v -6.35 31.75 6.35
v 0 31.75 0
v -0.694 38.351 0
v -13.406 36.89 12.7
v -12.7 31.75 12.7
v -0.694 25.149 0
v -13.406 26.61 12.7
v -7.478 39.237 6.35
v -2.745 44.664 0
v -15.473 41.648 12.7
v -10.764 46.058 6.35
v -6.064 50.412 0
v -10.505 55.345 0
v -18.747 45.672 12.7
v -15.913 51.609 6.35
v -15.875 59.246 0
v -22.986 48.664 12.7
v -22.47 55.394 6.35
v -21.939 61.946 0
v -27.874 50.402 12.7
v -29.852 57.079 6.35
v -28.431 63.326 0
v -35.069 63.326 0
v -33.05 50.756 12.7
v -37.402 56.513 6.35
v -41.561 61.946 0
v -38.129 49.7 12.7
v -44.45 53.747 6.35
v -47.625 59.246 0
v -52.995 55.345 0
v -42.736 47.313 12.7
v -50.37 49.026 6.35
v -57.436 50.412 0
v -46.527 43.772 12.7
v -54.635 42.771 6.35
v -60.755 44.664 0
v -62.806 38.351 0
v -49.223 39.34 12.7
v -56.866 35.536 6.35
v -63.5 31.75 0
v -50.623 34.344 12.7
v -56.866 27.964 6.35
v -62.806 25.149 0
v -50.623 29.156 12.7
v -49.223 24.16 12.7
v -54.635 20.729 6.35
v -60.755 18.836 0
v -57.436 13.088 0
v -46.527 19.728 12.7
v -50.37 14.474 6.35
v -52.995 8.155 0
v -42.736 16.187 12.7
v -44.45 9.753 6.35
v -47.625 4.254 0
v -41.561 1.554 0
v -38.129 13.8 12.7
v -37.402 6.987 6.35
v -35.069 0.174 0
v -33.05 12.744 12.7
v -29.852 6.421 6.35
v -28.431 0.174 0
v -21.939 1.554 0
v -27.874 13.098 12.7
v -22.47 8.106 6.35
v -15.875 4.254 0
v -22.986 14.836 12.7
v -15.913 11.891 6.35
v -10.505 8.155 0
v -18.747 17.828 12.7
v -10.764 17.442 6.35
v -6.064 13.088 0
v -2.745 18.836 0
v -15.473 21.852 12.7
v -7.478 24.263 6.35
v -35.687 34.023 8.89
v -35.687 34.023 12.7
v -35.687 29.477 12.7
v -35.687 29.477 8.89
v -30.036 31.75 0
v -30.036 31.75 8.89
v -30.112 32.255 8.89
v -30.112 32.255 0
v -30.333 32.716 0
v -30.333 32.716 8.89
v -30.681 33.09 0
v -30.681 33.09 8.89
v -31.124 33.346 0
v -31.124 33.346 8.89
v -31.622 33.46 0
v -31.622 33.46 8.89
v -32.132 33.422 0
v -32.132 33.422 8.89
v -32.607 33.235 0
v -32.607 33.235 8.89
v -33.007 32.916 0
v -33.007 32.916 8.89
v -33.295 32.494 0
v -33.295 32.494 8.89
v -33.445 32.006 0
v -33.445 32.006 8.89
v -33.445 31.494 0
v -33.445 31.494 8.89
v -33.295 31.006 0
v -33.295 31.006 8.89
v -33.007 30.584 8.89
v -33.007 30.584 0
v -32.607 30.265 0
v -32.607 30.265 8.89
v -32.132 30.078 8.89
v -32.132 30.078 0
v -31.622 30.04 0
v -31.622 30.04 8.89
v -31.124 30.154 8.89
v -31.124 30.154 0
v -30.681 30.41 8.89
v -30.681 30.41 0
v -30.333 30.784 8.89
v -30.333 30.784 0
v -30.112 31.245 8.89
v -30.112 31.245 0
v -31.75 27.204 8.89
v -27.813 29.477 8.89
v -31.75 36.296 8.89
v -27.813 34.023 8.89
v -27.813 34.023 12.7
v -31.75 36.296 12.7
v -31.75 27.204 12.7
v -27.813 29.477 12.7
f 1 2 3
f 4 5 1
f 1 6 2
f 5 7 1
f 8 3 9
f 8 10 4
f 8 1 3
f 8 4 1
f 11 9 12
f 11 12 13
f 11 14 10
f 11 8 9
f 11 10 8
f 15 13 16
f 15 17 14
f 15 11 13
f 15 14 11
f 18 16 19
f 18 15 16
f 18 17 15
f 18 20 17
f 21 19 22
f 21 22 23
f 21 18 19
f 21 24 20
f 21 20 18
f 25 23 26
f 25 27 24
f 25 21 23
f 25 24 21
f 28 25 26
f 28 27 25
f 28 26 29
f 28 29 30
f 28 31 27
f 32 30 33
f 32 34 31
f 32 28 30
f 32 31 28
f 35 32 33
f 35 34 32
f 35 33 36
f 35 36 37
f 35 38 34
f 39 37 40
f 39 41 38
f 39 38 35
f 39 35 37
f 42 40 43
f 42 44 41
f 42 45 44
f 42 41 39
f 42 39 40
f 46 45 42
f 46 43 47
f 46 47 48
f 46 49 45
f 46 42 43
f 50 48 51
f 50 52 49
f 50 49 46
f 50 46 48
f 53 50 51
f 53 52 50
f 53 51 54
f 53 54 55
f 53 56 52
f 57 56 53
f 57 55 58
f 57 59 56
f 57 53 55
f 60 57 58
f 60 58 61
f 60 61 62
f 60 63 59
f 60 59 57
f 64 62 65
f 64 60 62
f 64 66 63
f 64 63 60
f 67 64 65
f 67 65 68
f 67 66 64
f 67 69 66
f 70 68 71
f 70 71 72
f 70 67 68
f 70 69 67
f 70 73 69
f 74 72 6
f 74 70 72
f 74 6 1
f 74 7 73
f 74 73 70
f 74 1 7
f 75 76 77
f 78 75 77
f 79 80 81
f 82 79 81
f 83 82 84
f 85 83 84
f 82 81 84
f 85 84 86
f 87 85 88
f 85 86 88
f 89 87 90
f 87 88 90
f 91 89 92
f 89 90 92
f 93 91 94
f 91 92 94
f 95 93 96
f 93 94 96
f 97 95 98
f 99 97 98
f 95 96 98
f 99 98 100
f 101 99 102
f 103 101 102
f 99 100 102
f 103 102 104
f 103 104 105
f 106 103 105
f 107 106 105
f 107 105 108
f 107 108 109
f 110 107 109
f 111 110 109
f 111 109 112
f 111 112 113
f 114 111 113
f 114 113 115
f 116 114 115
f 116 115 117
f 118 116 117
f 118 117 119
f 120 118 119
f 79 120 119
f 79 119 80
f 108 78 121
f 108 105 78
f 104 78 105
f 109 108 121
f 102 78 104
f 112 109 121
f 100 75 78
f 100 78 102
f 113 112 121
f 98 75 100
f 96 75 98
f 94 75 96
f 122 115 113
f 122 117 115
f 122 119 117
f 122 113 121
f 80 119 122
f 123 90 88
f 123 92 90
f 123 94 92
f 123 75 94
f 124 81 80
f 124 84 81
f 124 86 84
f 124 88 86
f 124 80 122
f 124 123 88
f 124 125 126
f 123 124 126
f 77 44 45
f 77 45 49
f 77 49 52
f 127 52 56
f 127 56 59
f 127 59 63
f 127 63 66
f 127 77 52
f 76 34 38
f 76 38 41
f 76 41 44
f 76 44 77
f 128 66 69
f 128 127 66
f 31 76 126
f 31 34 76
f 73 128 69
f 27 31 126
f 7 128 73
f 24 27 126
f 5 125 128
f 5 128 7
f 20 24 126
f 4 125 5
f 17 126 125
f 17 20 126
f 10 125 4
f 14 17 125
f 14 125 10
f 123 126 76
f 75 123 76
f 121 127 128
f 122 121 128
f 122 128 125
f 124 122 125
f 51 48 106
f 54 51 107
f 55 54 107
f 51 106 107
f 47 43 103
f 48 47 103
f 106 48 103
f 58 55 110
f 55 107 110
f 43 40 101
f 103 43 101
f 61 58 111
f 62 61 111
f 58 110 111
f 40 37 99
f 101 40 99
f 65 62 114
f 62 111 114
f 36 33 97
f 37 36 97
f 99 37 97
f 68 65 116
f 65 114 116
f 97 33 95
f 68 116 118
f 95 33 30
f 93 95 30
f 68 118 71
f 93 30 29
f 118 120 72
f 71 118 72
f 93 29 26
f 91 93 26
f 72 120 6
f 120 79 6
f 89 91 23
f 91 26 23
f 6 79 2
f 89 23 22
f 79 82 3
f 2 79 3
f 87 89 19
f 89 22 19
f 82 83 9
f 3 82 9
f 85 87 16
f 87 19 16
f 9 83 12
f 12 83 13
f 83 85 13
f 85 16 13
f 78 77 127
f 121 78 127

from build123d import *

# Parameters (mm, degrees)
F2_R     = 25.4
F2_R_2   = 1.7145
F4_DEPTH = 12.7
F0_R     = 31.75
F0_R_2   = 1.7145
F5_DEPTH = 12.7
F6_R     = 1.7145
F7_DEPTH = 3.81
F8_SIZE2 = 12.69999
F8_SIZE  = 12.69999


# Not quite as in the source:
# - a fillet or chamfer is up to 0.001 mm smaller than in the source, because OpenCascade refuses the exact size


with BuildPart() as f4:
    # F2 (on offset) → F4 (new body)
    with BuildSketch(Plane.XY.offset(12.7)):
        with Locations((-31.75, 31.75)):
            Circle(F2_R)
        with Locations((-31.75, 31.75)):
            Circle(F2_R_2, mode=Mode.SUBTRACT)
    extrude(amount=-F4_DEPTH)

    # F0 (on Top) → F5 (join)
    with BuildSketch(Plane.XY):
        with Locations((-31.75, 31.75)):
            Circle(F0_R)
        with Locations((-31.75, 31.75)):
            Circle(F0_R_2, mode=Mode.SUBTRACT)
    extrude(amount=F5_DEPTH)

    # F6 (on face) → F7 (cut)
    with BuildSketch(Plane.XY.offset(12.7)):
        Polygon((-27.813, 29.4769719902), (-27.813, 34.0230280098), (-31.75, 36.2960560196), (-35.687, 34.0230280098), (-35.687, 29.4769719902), (-31.75, 27.2039439804), align=None)
        with Locations((-31.75, 31.75)):
            Circle(F6_R, mode=Mode.SUBTRACT)
    extrude(amount=-F7_DEPTH, mode=Mode.SUBTRACT)

    # F8 (size 12.7 and 12.7 in the source; OpenCascade refuses exactly that, so slightly less here)
    f8_edges = [f4.edges().sort_by_distance(p)[0] for p in [
        (-63.5, 31.75, 12.7),
    ]]
    chamfer(f8_edges, length=F8_SIZE, length2=F8_SIZE2)


solid = f4.part
